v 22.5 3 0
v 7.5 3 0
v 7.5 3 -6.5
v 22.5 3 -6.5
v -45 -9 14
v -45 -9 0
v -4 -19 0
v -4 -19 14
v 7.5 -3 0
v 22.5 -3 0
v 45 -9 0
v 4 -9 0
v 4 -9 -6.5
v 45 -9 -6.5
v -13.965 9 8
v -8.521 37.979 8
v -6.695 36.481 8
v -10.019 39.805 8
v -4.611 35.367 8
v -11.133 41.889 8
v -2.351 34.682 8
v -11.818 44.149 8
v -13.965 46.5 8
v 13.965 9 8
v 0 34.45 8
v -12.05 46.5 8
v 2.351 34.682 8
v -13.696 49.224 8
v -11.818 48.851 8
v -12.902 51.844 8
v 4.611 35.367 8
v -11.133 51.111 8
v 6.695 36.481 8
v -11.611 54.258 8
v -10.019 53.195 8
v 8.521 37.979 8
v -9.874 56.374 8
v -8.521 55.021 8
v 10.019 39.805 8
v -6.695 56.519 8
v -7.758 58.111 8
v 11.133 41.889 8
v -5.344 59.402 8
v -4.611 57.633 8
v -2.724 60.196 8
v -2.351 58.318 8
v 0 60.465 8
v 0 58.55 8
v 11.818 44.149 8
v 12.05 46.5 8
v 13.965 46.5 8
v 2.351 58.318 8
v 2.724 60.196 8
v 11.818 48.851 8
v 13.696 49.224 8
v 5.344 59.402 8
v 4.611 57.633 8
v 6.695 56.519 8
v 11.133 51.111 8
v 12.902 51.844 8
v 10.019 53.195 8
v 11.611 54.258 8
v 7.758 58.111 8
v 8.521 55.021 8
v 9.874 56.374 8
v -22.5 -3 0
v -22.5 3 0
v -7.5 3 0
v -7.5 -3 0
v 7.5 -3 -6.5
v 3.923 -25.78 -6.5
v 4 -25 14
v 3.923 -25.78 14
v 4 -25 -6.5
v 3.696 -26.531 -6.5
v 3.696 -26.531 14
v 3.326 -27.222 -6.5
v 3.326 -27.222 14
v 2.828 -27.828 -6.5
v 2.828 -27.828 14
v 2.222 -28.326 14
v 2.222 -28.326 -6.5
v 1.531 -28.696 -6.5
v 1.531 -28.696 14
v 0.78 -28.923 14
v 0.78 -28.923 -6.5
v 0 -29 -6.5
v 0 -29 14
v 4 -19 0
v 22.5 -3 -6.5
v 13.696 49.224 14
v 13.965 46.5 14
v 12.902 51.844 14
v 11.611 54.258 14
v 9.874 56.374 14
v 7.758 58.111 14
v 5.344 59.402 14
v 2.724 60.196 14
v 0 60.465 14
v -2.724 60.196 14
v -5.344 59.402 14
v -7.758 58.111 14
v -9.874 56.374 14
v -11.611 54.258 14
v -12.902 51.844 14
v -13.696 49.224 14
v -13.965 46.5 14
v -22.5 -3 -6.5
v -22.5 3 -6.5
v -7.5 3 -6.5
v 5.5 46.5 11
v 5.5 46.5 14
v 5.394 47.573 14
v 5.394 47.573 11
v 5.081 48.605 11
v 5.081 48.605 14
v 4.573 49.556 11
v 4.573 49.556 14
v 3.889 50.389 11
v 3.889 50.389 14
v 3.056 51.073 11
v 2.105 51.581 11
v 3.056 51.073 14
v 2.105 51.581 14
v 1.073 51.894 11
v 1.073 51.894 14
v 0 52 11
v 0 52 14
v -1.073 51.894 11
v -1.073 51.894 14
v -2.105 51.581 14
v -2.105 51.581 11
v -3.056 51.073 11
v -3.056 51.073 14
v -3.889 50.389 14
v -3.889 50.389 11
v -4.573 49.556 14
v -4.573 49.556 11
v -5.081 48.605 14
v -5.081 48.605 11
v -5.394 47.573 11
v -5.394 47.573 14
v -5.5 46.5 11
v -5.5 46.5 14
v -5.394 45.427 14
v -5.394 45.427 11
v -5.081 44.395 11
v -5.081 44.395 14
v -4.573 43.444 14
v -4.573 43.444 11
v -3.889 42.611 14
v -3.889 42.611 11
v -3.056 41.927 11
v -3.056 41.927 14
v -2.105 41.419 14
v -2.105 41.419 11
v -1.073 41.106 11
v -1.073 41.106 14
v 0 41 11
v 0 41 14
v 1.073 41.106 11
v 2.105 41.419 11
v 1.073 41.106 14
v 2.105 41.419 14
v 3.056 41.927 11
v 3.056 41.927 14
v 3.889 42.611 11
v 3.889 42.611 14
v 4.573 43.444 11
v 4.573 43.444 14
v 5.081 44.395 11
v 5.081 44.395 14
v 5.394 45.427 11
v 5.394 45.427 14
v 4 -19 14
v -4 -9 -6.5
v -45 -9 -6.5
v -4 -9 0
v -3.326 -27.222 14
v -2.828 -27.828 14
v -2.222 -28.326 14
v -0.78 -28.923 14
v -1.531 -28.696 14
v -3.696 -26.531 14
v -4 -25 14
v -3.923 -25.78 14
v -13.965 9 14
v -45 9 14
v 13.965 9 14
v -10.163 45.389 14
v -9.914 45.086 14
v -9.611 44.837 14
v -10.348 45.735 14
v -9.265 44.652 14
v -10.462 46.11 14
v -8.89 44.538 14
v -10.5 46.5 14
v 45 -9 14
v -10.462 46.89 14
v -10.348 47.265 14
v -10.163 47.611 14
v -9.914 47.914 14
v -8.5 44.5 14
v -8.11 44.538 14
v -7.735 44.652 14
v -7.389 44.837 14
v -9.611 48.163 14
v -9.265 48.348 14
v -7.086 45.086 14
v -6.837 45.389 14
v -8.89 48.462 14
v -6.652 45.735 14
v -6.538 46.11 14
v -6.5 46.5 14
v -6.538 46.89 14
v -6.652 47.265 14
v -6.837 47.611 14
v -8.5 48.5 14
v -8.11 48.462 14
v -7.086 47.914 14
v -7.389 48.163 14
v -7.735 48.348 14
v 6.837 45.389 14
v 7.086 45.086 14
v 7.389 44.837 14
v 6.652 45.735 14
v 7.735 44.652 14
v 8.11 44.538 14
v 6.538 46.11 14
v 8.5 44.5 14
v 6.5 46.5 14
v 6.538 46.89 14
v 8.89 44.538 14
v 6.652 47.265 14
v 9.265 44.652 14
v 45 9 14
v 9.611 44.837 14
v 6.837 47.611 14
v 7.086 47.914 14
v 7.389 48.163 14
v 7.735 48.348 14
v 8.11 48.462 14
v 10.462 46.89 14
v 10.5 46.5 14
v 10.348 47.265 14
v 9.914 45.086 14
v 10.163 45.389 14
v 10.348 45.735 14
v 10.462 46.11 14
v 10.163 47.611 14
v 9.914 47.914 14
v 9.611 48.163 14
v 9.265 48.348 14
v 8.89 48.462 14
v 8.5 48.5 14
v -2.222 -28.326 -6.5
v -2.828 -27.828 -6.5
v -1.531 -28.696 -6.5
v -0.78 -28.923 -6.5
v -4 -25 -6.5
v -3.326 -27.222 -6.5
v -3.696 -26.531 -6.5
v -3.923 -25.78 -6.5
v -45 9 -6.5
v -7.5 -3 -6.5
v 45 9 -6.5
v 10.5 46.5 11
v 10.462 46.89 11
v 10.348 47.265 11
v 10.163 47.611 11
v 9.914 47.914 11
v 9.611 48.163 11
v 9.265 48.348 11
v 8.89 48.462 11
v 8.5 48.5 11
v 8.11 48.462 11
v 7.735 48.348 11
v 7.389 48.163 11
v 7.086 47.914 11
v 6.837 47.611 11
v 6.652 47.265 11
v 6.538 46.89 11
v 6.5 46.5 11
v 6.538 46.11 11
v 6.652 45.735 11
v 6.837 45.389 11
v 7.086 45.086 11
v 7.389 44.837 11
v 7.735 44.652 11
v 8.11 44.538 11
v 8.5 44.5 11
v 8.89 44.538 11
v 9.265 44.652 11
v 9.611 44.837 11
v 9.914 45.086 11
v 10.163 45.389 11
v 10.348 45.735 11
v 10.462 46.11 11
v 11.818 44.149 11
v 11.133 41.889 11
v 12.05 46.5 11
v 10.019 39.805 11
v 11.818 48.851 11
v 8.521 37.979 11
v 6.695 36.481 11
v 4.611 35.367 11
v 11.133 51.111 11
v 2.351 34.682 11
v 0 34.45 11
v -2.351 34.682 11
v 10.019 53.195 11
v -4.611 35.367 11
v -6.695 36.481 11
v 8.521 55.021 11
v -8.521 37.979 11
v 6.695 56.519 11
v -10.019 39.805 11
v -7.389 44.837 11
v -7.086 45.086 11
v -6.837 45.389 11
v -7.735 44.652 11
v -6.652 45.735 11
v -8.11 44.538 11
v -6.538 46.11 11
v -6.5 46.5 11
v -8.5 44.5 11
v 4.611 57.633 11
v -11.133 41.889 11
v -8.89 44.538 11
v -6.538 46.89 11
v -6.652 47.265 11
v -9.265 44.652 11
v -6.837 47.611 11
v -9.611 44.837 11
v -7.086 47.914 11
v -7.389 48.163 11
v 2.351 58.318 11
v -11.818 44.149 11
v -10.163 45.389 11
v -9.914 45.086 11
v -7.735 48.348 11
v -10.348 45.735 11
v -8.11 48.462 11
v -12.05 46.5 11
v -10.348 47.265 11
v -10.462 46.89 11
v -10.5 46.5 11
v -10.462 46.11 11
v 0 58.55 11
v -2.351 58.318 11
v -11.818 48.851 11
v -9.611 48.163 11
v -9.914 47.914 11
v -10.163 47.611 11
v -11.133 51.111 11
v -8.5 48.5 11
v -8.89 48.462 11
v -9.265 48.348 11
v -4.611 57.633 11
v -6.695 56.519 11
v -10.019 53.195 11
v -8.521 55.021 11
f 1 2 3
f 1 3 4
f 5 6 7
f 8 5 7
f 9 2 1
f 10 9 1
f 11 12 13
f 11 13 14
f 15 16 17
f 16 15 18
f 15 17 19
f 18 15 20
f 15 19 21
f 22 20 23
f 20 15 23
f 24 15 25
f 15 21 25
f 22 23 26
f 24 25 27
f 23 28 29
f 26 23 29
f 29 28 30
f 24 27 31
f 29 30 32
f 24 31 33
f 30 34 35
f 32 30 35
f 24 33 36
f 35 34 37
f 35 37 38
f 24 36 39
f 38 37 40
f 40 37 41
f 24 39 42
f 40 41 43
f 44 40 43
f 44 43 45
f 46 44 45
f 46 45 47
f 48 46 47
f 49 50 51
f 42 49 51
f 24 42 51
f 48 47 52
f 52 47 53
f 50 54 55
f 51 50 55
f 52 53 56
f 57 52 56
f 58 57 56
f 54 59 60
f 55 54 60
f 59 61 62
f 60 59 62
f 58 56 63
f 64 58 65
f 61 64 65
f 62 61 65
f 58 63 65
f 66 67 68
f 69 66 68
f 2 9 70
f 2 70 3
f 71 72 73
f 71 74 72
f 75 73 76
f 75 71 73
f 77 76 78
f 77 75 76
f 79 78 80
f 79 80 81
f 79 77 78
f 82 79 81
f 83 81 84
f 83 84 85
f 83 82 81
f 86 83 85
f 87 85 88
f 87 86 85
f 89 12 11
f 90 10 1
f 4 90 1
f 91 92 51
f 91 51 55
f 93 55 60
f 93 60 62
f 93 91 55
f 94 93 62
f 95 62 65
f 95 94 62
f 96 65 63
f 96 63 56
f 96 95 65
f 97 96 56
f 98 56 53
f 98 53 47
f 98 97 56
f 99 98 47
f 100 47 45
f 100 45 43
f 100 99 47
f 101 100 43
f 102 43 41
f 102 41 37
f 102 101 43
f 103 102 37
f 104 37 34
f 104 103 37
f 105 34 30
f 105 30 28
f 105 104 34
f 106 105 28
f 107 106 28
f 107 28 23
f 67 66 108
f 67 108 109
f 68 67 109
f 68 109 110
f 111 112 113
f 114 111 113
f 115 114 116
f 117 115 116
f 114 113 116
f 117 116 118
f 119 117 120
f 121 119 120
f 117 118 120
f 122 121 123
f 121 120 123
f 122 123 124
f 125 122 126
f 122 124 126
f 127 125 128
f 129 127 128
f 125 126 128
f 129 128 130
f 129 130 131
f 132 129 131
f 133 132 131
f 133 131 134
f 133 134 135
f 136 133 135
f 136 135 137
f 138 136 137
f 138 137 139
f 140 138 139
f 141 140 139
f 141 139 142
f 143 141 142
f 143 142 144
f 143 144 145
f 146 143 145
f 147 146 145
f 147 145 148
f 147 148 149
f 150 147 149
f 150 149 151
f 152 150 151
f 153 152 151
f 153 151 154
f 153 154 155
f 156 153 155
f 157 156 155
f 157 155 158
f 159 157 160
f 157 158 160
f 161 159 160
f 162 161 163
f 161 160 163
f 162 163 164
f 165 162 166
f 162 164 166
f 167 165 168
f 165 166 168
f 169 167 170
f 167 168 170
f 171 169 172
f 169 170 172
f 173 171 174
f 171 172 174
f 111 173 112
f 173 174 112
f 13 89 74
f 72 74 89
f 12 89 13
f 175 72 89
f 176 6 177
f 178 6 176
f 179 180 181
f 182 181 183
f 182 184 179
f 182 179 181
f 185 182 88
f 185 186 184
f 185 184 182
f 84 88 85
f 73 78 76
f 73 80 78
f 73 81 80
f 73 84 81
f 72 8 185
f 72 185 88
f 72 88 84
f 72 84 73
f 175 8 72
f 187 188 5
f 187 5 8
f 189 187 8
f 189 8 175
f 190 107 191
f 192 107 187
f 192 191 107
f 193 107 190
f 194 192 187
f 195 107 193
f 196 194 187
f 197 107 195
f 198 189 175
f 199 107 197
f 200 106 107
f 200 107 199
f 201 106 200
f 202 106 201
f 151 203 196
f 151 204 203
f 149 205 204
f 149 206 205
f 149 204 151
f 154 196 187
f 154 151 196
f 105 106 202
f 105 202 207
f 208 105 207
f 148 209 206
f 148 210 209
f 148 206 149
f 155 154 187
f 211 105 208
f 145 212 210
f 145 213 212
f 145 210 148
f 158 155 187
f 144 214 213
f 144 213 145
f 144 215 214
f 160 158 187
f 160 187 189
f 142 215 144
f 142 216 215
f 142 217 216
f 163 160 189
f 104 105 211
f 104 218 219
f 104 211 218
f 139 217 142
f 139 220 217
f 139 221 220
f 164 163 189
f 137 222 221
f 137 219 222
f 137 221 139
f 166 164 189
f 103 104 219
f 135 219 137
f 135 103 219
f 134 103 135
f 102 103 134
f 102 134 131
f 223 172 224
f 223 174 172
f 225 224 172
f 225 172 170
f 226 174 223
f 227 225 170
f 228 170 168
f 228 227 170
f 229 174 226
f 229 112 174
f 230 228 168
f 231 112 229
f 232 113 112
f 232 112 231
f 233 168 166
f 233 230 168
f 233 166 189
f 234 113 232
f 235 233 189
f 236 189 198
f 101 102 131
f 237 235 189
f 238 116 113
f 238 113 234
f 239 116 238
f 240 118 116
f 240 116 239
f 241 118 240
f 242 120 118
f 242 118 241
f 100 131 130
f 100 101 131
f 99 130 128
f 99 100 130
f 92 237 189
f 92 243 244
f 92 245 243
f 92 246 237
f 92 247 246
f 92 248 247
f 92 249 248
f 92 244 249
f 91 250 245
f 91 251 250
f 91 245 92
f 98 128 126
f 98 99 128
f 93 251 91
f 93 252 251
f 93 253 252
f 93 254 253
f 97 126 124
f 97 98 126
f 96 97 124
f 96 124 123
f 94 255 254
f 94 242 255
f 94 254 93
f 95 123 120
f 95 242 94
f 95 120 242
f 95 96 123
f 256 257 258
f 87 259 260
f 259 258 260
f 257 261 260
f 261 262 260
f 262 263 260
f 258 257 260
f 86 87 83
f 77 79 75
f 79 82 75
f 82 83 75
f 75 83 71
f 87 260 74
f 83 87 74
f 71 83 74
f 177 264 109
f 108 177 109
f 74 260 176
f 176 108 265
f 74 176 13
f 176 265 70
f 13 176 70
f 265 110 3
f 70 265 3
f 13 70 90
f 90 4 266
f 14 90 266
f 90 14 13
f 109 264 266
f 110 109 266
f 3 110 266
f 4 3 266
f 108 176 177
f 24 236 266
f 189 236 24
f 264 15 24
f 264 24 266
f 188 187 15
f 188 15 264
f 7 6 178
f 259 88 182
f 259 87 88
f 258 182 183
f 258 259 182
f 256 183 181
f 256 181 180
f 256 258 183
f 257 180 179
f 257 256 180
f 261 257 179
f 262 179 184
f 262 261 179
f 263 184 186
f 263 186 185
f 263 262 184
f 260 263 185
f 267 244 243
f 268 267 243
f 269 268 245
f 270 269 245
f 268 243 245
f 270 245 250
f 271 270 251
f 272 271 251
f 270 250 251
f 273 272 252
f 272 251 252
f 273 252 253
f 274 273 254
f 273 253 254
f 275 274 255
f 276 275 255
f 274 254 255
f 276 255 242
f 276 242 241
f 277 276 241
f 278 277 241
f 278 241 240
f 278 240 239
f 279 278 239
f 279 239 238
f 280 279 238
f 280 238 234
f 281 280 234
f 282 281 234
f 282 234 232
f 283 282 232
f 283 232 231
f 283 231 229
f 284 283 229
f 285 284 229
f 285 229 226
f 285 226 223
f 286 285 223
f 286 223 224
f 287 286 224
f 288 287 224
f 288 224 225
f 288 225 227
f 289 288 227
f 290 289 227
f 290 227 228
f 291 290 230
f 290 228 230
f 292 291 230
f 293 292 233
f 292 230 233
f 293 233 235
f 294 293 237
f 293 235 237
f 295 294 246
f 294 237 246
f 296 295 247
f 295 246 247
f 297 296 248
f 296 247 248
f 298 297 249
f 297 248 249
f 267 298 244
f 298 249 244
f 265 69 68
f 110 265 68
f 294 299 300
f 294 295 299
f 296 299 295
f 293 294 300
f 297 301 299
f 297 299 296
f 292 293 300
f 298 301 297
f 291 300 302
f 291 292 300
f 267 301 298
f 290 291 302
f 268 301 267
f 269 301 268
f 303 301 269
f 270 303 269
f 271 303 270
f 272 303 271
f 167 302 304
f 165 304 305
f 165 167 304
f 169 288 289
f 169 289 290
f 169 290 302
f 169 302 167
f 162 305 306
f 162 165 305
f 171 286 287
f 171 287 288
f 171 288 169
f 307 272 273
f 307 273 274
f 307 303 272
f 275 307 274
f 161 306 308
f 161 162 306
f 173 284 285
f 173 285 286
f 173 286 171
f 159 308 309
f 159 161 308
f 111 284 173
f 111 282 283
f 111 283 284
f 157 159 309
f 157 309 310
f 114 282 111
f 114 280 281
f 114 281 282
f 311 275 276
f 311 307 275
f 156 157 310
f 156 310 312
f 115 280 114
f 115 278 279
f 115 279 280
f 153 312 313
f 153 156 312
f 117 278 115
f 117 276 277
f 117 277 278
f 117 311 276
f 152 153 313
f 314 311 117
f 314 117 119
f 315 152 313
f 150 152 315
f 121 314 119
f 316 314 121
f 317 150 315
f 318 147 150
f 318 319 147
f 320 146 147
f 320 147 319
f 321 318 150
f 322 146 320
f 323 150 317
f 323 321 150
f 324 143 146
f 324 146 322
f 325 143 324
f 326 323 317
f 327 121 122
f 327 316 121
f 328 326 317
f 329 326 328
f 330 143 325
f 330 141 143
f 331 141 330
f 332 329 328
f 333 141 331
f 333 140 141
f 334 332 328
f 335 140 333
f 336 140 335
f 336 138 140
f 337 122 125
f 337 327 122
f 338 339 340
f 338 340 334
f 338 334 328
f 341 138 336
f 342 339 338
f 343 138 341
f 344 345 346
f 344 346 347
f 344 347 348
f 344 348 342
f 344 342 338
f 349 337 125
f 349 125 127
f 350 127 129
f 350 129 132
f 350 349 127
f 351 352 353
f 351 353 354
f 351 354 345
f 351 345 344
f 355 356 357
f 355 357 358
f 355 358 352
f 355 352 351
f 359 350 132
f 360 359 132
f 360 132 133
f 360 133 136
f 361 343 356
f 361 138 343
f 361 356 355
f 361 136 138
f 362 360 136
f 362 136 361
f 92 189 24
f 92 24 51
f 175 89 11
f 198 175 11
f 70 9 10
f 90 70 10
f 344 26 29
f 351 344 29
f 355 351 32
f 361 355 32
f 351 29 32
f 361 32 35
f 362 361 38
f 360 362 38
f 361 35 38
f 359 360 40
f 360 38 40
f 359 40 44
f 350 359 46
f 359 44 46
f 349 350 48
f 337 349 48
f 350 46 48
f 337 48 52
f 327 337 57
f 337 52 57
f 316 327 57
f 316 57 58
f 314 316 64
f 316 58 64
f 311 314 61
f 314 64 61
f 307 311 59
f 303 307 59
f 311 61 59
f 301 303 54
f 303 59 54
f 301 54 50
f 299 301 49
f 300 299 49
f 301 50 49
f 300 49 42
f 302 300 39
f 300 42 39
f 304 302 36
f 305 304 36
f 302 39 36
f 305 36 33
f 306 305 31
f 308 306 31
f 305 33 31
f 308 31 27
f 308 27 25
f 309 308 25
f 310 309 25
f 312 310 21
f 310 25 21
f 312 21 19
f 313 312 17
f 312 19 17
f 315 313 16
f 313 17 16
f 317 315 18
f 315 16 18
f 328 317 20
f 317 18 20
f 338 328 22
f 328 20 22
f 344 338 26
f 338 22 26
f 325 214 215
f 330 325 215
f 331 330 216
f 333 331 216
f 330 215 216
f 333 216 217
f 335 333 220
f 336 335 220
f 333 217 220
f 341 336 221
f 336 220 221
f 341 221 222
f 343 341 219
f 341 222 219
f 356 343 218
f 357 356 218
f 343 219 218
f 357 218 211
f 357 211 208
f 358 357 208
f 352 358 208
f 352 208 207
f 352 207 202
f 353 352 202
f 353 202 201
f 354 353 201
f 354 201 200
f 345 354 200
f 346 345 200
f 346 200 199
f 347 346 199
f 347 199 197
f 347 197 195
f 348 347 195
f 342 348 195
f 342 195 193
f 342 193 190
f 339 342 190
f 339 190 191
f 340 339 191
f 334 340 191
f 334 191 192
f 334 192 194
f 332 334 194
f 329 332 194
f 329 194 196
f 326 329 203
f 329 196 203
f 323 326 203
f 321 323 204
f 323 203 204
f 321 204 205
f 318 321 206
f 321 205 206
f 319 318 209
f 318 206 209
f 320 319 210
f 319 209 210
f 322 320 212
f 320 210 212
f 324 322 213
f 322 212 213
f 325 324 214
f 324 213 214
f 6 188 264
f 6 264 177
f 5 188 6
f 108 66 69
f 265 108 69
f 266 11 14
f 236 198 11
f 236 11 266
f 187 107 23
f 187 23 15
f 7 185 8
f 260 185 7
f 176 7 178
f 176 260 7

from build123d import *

# Parameters (mm, degrees)
SKETCH1_W           = 15
SKETCH1_H           = 6
SKETCH1_W_2         = 8
SKETCH1_H_2         = 20
BOSS_EXTRUDE1_DEPTH = 14
SKETCH3_W           = 15
SKETCH3_H           = 6
SKETCH3_W_2         = 8
SKETCH3_H_2         = 20
BOSS_EXTRUDE2_DEPTH = 6.5
FILLET1_R           = 4
SKETCH4_R           = 2
SKETCH4_R_2         = 5.5
BOSS_EXTRUDE3_DEPTH = 6
SKETCH5_R           = 12.05
CUT_EXTRUDE1_DEPTH  = 3


with BuildPart() as part:
    # Sketch1 → Boss-Extrude1 (new body)
    # profile 1 of 6: a face of its own
    with BuildSketch(Plane.XY):
        Polygon((-4, -9), (4, -9), (45, -9), (45, 9), (-45, 9), (-45, -9), align=None)
        with Locations((-15, 0)):
            Rectangle(SKETCH1_W, SKETCH1_H, mode=Mode.SUBTRACT)
        with Locations((15, 0)):
            Rectangle(SKETCH1_W, SKETCH1_H, mode=Mode.SUBTRACT)
    # profile 2 of 6: a face of its own
    with BuildSketch(Plane.XY):
        with Locations((0, -19)):
            Rectangle(SKETCH1_W_2, SKETCH1_H_2)
    # profile 3 of 6: a face of its own
    with BuildSketch(Plane.XY):
        with Locations((-15, 0)):
            Rectangle(SKETCH1_W, SKETCH1_H)
    # profile 4 of 6: a face of its own
    with BuildSketch(Plane.XY):
        with Locations((15, 0)):
            Rectangle(SKETCH1_W, SKETCH1_H)
    # profile 5 of 6: a face of its own
    with BuildSketch(Plane.XY):
        Polygon((45, -9), (4, -9), (4, -19), align=None)
    # profile 6 of 6: a face of its own
    with BuildSketch(Plane.XY):
        Polygon((-4, -19), (-4, -9), (-45, -9), align=None)
    extrude(amount=BOSS_EXTRUDE1_DEPTH)

    # Sketch3 → Boss-Extrude2 (add)
    # profile 1 of 2: a face of its own
    with BuildSketch(Plane.XY):
        Polygon((-4, -9), (4, -9), (45, -9), (45, 9), (-45, 9), (-45, -9), align=None)
        with Locations((-15, 0)):
            Rectangle(SKETCH3_W, SKETCH3_H, mode=Mode.SUBTRACT)
        with Locations((15, 0)):
            Rectangle(SKETCH3_W, SKETCH3_H, mode=Mode.SUBTRACT)
    # profile 2 of 2: a face of its own
    with BuildSketch(Plane.XY):
        with Locations((0, -19)):
            Rectangle(SKETCH3_W_2, SKETCH3_H_2)
    extrude(amount=-BOSS_EXTRUDE2_DEPTH)

    # Fillet1
    fillet1_edges = [part.edges().sort_by_distance(p)[0] for p in [
        (-4, -29, 3.75),
        (4, -29, 3.75),
    ]]
    fillet(fillet1_edges, radius=FILLET1_R - 0.0001)  # a hair under: the kernel refuses the full size

    # Sketch4 → Boss-Extrude3 (add)
    with BuildSketch(Plane.XY.offset(14)):
        with BuildLine():
            Line((13.964514824, 9), (13.964514824, 46.5))
            ThreePointArc((13.964514824, 46.5), (0, 60.464514824), (-13.964514824, 46.5))
            Line((-13.964514824, 46.5), (-13.964514824, 9))
            Line((-13.964514824, 9), (13.964514824, 9))
        make_face()
        with Locations((8.5, 46.5)):
            Circle(SKETCH4_R, mode=Mode.SUBTRACT)
        with Locations((-8.5, 46.5)):
            Circle(SKETCH4_R, mode=Mode.SUBTRACT)
        with Locations((0, 46.5)):
            Circle(SKETCH4_R_2, mode=Mode.SUBTRACT)
    extrude(amount=-BOSS_EXTRUDE3_DEPTH)

    # Sketch5 → Cut-Extrude1 (cut)
    with BuildSketch(Plane(origin=(0, 0, 8), x_dir=(-1, 0, 0), z_dir=(0, 0, -1))):
        with Locations((0, 46.5)):
            Circle(SKETCH5_R)
    extrude(amount=-CUT_EXTRUDE1_DEPTH, mode=Mode.SUBTRACT)


solid = part.part
